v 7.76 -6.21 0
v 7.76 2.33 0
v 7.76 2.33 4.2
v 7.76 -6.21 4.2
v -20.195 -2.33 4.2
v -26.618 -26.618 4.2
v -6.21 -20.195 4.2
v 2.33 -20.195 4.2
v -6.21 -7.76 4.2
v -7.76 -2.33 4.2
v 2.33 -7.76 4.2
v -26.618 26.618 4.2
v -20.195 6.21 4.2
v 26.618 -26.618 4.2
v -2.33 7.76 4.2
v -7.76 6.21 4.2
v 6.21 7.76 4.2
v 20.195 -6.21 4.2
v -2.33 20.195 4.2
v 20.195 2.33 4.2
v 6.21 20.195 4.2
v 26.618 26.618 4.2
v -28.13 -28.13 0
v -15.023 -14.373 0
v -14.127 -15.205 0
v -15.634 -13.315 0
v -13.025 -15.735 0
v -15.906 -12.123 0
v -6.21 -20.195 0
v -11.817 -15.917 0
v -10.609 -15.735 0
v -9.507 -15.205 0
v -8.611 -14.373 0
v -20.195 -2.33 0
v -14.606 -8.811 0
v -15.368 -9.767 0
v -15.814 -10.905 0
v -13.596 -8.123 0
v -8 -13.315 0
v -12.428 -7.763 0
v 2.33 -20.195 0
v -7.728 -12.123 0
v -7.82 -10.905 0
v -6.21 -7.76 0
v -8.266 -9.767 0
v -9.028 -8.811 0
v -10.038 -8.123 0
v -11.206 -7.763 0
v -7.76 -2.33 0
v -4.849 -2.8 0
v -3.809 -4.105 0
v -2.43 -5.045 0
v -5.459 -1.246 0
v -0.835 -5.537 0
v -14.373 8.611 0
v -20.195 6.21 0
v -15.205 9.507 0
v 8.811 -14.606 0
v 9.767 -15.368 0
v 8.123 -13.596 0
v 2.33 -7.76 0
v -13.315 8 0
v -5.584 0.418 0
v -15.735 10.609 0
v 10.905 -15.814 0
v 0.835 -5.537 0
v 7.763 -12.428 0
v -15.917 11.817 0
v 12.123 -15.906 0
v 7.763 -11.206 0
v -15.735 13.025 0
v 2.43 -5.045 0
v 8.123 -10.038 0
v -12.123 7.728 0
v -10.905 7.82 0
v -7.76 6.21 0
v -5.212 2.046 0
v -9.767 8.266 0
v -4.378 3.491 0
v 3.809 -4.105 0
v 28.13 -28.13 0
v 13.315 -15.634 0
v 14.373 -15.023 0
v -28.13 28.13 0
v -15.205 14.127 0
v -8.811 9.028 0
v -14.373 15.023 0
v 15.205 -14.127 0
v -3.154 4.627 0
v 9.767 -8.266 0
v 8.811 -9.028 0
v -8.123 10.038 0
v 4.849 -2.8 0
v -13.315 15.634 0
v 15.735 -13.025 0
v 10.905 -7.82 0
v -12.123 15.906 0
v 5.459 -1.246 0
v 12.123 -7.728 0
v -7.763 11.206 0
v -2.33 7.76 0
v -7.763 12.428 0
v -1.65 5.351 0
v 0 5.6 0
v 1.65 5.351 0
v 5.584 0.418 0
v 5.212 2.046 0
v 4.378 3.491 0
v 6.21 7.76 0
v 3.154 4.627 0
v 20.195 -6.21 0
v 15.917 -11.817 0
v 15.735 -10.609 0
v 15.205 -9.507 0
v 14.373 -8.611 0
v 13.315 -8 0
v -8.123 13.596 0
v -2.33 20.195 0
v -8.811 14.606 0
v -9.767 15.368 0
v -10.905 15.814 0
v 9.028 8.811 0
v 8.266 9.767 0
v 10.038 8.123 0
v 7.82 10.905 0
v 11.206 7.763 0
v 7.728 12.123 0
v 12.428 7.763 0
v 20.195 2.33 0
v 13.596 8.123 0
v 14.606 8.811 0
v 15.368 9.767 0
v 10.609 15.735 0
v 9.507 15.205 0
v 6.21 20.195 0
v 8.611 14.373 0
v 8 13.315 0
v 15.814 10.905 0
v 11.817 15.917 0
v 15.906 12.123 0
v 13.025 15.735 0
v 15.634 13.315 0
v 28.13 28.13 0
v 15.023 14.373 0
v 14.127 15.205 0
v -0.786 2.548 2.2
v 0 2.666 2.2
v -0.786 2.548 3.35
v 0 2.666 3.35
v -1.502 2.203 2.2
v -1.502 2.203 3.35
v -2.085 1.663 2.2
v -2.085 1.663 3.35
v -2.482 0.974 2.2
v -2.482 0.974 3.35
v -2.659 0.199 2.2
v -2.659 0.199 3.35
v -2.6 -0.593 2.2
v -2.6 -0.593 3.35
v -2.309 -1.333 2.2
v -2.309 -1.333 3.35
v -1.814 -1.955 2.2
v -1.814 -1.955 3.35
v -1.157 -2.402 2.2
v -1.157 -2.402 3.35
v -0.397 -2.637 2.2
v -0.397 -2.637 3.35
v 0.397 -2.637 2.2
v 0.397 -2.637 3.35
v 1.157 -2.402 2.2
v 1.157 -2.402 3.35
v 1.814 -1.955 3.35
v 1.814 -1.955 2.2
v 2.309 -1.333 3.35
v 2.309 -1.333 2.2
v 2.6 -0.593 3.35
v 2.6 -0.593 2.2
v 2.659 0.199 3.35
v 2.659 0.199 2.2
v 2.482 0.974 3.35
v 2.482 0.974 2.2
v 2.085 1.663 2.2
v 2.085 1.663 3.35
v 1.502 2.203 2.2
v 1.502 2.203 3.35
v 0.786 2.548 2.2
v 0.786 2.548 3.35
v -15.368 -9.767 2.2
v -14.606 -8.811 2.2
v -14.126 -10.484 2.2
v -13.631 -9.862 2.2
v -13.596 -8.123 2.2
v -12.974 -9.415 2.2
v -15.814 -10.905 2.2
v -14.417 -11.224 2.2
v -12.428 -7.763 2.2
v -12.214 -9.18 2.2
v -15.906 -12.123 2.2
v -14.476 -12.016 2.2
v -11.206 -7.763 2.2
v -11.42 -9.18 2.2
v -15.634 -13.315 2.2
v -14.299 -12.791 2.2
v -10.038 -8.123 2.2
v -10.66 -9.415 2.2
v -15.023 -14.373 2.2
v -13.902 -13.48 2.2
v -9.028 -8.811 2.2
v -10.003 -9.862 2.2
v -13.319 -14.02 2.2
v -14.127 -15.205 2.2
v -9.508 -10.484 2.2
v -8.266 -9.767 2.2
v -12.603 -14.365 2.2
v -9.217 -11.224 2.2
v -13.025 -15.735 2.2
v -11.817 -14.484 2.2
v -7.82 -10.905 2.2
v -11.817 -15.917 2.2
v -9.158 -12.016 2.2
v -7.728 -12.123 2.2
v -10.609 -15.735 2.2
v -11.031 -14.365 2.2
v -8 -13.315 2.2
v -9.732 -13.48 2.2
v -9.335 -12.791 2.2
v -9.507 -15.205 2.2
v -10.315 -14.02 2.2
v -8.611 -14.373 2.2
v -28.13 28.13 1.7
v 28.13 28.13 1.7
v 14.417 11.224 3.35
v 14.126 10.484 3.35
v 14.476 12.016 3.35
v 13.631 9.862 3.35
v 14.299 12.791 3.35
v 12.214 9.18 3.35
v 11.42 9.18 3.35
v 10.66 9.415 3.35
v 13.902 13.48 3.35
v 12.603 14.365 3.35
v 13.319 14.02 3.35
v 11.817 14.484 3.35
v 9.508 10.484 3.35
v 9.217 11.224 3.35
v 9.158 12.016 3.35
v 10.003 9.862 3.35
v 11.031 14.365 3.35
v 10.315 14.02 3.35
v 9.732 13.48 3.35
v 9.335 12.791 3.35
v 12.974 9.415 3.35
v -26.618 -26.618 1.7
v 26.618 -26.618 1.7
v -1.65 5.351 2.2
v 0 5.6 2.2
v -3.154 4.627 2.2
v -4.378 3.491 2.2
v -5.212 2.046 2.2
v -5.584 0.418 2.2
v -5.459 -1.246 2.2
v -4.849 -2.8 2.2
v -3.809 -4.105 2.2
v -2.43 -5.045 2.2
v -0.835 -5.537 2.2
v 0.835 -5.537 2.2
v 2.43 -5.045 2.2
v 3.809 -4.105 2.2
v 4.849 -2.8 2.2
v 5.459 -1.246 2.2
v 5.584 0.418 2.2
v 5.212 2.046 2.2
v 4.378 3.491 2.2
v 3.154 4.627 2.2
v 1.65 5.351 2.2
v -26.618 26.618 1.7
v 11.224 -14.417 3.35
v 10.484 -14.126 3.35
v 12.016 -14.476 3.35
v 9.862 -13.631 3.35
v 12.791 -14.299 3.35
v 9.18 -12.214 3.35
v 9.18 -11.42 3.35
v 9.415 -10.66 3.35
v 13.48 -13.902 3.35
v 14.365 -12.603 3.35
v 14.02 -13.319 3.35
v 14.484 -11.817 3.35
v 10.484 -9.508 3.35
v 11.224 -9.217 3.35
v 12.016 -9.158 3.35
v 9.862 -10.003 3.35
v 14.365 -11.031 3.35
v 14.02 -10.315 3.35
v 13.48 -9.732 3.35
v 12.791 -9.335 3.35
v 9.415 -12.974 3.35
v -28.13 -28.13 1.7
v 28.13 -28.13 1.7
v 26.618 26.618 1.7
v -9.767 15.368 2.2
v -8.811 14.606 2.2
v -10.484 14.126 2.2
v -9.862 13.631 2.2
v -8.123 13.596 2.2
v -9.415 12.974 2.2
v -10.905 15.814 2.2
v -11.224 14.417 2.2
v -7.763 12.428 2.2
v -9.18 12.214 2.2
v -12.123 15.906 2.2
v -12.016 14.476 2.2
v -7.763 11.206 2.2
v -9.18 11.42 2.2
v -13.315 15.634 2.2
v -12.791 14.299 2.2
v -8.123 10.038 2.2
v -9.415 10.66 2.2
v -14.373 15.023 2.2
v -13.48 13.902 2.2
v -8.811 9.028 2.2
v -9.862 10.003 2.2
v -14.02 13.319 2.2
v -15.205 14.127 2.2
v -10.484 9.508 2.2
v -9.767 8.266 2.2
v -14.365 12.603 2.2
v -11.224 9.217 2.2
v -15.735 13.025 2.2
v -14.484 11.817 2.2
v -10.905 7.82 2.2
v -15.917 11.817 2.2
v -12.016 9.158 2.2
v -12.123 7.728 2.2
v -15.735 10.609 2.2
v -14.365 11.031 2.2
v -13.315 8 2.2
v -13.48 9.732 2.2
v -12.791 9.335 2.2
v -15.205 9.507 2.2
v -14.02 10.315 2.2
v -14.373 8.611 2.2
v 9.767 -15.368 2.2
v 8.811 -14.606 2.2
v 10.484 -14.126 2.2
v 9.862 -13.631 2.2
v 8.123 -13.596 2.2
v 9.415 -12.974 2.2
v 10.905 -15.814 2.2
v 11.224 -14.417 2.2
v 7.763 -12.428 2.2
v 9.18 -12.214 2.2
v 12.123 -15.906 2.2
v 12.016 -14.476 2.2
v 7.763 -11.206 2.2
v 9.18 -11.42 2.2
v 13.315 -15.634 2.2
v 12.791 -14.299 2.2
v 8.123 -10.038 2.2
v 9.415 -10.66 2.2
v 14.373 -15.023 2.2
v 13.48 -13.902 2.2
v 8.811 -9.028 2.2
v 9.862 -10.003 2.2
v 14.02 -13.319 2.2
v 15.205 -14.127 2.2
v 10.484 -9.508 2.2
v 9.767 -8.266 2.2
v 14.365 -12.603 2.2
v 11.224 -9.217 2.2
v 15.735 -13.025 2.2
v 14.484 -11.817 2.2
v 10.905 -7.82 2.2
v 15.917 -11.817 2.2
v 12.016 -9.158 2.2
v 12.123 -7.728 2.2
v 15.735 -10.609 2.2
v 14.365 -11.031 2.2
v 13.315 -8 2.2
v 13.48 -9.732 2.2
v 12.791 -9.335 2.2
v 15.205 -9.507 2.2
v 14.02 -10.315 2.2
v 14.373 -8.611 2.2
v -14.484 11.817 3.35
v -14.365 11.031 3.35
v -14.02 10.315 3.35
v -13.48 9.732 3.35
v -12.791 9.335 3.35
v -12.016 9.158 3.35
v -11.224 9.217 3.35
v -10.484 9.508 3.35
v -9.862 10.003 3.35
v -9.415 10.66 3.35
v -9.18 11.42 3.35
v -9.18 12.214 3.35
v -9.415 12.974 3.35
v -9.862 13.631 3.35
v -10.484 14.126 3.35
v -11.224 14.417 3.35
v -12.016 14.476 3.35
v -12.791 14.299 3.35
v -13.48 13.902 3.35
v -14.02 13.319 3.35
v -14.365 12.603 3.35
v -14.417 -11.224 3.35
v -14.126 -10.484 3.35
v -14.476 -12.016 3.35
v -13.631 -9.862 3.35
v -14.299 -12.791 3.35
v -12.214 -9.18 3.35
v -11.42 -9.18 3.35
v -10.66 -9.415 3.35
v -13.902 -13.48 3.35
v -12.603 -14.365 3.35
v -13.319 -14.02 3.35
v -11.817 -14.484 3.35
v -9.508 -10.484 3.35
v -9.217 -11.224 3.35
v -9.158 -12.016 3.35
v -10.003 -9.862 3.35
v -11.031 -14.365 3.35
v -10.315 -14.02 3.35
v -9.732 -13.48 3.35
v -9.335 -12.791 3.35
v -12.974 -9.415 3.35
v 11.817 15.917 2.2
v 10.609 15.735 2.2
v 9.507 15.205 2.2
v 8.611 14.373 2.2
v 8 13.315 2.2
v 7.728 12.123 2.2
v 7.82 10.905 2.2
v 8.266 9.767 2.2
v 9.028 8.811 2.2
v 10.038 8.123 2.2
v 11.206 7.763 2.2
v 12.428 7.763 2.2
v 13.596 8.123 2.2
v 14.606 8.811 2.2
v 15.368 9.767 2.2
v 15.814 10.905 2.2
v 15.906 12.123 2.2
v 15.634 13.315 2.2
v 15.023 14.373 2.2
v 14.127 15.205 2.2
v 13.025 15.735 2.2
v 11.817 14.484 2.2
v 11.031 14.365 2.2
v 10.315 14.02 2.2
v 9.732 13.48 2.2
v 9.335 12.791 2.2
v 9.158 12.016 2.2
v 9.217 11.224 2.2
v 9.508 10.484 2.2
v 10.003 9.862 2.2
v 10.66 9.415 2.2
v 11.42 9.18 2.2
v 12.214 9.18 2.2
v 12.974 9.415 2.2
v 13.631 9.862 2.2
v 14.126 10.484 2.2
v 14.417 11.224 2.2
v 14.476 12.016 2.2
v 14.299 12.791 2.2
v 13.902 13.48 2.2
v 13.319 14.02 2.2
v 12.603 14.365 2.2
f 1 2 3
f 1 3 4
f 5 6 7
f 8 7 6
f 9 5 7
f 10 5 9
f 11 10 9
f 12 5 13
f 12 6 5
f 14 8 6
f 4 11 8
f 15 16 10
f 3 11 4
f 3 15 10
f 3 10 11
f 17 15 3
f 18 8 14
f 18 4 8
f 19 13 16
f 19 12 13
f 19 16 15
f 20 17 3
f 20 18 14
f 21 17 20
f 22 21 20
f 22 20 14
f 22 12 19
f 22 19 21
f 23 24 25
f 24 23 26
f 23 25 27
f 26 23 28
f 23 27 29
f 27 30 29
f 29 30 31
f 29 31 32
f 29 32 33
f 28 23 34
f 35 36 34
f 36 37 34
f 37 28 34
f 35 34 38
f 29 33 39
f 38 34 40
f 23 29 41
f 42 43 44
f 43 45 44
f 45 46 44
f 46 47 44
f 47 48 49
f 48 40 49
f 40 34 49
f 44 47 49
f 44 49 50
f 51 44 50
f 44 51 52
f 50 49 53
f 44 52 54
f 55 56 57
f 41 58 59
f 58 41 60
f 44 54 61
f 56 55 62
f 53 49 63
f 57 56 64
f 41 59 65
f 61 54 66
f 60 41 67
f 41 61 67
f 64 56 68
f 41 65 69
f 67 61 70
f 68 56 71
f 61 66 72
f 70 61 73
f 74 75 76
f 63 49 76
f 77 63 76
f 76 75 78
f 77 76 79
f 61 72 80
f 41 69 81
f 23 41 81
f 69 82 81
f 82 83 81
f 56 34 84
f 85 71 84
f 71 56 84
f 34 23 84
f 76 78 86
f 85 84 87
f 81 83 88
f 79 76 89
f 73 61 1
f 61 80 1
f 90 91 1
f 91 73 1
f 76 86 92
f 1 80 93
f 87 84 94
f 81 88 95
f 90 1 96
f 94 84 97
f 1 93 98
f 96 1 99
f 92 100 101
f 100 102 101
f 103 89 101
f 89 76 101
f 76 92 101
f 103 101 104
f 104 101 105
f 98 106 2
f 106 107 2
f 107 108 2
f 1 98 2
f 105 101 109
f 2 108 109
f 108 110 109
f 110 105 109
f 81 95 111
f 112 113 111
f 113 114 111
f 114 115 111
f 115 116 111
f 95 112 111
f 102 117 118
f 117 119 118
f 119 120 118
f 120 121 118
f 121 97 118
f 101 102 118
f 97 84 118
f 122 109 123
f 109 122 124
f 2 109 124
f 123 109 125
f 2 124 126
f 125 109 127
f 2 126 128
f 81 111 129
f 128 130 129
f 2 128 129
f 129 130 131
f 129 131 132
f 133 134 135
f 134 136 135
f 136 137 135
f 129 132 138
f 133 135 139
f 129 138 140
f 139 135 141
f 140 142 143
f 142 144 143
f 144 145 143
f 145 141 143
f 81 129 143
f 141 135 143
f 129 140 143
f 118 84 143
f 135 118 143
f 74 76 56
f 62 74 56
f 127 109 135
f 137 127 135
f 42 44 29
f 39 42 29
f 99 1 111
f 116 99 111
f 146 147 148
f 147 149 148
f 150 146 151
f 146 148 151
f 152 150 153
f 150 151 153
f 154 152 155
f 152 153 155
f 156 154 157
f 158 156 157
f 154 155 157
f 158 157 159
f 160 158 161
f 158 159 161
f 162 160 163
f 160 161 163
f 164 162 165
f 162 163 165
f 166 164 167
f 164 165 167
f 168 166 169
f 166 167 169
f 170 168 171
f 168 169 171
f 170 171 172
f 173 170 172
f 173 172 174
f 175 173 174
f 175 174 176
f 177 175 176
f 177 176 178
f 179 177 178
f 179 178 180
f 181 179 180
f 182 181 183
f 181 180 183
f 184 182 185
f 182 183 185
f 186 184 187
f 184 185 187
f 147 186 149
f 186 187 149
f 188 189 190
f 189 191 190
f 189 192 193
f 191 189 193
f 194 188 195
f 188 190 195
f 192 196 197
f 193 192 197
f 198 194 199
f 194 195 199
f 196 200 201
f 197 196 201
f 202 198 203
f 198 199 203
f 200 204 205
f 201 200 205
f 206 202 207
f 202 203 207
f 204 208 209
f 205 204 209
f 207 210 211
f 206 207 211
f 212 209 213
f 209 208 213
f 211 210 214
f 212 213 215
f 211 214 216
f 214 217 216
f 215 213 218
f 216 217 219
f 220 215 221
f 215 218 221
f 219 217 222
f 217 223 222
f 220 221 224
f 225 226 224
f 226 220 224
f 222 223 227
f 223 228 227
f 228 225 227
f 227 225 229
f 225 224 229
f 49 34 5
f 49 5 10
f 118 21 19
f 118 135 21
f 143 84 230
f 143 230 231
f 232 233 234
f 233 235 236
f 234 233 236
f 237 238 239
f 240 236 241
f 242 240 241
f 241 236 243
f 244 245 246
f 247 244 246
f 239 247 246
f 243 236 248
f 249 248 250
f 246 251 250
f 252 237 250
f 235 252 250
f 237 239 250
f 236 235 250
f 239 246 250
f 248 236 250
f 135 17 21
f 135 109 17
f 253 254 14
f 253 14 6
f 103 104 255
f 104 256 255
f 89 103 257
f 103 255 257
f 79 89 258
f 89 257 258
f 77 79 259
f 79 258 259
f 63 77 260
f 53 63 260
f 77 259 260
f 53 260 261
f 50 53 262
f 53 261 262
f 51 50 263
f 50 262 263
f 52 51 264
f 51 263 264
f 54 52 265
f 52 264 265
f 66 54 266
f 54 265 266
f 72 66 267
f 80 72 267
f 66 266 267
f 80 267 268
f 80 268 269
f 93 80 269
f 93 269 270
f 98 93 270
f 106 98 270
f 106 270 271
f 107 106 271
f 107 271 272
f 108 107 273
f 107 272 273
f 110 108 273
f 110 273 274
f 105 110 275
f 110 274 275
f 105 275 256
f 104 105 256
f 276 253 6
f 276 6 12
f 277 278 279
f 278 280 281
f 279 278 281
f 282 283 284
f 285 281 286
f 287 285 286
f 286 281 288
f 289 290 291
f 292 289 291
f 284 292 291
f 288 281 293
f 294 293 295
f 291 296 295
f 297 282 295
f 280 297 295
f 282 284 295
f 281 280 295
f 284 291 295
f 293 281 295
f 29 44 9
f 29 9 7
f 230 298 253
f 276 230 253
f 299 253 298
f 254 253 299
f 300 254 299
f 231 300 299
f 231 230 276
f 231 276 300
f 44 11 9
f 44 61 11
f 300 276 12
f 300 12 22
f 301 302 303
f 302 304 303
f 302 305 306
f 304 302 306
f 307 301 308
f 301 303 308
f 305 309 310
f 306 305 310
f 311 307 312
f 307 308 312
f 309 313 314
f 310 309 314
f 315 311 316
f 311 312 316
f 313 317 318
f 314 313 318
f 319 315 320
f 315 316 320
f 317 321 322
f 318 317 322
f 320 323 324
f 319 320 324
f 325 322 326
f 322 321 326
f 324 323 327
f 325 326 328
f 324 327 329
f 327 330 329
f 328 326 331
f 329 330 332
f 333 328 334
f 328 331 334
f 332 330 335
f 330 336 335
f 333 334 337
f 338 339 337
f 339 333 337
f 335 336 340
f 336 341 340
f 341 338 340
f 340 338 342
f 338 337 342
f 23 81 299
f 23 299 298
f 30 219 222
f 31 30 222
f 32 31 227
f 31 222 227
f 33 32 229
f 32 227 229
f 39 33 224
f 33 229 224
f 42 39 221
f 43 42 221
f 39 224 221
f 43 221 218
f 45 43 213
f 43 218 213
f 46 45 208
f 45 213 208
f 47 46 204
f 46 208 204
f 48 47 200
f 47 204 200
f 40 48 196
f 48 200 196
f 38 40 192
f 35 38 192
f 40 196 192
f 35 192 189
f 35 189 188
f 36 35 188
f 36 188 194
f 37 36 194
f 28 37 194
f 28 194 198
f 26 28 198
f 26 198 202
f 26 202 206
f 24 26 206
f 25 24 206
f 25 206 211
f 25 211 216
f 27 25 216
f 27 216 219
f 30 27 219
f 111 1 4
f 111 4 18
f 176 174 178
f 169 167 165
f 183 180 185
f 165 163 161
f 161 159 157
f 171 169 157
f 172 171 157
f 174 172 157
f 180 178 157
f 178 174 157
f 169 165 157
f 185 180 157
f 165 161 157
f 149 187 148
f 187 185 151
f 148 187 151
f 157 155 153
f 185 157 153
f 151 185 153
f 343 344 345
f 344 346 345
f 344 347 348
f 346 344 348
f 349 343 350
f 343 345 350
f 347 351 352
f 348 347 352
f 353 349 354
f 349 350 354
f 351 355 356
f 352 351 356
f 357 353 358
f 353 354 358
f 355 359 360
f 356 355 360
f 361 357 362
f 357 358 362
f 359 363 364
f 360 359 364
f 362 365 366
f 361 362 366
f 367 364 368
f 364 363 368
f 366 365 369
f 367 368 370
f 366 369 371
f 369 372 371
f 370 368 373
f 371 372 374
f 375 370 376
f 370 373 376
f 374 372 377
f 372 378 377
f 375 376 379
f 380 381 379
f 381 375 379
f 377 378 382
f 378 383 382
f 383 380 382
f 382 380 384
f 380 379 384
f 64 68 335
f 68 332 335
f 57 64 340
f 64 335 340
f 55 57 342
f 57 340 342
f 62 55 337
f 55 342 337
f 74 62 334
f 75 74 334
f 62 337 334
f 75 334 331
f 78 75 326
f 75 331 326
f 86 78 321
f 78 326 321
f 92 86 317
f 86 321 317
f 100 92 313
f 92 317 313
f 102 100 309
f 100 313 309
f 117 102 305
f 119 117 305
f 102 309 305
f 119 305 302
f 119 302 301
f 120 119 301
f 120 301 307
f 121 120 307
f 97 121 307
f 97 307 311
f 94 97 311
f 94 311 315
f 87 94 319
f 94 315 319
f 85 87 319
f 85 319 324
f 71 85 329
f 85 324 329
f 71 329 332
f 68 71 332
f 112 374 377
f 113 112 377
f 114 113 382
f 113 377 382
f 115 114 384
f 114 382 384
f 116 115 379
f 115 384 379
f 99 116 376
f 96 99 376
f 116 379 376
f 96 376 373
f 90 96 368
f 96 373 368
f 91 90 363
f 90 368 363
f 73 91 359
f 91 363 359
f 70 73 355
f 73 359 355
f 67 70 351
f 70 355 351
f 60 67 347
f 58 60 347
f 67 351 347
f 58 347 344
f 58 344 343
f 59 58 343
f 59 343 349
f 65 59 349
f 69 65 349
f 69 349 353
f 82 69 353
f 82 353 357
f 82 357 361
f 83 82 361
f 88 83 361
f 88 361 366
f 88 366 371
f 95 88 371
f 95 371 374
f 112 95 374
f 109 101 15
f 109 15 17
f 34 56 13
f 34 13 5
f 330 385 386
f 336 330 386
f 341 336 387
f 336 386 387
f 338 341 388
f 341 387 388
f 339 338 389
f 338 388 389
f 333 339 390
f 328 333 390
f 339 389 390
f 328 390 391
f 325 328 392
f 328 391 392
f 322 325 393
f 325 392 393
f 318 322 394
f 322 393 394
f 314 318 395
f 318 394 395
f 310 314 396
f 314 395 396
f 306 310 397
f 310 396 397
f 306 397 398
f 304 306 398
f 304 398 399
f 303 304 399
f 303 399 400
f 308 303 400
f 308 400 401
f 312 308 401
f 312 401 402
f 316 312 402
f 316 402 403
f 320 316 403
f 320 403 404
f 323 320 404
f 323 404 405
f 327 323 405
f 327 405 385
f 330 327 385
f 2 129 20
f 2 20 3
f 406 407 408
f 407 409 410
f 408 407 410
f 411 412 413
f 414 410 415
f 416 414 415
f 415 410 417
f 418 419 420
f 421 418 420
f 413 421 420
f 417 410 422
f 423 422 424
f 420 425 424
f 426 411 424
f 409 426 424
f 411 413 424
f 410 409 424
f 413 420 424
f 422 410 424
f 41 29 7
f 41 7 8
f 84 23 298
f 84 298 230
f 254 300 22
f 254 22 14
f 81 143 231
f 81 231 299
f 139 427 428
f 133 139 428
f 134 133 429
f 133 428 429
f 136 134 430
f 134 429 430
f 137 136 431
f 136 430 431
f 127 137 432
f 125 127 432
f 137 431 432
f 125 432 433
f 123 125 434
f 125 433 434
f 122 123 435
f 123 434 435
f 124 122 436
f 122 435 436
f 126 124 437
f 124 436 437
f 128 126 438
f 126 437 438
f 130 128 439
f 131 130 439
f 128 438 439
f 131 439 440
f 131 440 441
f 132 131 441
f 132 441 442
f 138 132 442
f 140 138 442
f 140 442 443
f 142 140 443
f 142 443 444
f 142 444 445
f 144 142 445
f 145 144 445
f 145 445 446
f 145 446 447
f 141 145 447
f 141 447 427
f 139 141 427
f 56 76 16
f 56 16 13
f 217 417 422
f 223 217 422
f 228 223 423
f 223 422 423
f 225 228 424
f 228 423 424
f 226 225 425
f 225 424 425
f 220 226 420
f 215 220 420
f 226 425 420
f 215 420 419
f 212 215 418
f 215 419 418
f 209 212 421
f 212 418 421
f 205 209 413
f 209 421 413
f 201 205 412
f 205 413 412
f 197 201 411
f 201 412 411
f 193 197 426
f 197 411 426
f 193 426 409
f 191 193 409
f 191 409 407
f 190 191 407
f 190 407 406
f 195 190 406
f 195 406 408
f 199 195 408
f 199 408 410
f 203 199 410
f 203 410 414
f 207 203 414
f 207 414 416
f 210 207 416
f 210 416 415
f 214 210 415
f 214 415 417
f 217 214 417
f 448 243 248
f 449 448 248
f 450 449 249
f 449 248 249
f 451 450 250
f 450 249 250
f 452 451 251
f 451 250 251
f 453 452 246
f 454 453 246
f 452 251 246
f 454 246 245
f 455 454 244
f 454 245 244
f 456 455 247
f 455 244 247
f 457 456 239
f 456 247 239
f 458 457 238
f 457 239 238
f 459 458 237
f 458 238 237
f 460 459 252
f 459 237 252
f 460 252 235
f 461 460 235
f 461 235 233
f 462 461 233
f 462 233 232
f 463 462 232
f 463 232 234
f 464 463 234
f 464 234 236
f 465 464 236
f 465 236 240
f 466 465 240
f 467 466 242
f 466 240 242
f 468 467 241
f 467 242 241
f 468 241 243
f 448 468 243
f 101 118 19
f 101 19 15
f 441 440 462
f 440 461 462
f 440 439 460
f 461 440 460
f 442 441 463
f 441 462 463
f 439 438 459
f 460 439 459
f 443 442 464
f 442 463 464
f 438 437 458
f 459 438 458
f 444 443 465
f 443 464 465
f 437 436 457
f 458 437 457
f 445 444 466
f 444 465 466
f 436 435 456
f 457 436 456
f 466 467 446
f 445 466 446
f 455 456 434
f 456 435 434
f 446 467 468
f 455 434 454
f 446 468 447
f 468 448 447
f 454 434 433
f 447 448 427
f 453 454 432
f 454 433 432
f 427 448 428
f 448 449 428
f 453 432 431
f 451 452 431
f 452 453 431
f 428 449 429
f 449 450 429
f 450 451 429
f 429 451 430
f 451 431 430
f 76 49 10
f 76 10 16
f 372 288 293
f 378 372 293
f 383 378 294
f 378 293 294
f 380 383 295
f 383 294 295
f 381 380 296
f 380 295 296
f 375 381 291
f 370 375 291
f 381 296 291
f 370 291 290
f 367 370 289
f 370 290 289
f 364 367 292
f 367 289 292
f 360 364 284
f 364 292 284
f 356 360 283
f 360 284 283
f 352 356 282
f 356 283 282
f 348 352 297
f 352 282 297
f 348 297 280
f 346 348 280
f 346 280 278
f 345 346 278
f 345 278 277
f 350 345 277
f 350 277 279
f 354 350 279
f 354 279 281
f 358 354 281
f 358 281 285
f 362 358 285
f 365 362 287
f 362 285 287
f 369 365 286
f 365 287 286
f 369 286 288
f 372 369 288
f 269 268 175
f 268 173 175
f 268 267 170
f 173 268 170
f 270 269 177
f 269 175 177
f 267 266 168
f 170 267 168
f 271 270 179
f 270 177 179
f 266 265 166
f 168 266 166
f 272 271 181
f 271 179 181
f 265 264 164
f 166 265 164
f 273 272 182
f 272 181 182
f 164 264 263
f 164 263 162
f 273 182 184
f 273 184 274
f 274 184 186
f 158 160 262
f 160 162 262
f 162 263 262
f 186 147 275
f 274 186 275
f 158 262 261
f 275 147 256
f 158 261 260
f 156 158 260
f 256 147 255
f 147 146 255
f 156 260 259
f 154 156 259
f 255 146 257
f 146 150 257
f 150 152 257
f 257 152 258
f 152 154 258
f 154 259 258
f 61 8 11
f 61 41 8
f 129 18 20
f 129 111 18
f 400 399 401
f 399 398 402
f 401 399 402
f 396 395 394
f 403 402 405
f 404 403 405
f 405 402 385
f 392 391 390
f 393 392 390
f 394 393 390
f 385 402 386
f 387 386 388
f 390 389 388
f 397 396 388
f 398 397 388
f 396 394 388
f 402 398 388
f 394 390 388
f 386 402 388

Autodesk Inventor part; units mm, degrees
ref_plane "YZ Plane" through (0, 0, 0) normal (1, 0, 0) x (0, 1, 0)
ref_plane "XZ Plane" through (0, 0, 0) normal (0, 1, 0) x (-1, 0, 0)
ref_plane "XY Plane" through (0, 0, 0) normal (0, 0, 1) x (1, 0, 0)
sketch "Skizze1" plane through (0, 0, 0) normal (0, 0, 1) x (1, 0, 0)
  line L0 (-28.13, 28.13) -> (28.13, 28.13)
  line L1 (28.13, 28.13) -> (28.13, -28.13)
  line L2 (28.13, -28.13) -> (-28.13, -28.13)
  line L3 (-28.13, -28.13) -> (-28.13, 28.13)
  line L4 (-39.382, 0) -> (39.382, 0) construction
  line L5 (0, -39.382) -> (0, 39.382) construction
  point P0 (0, 0)
  dimension "d0" = 56.26
extrude "Extrusion1" add sketch "Skizze1" along normal blind 1.7
sketch "Skizze2" plane through (0, 0, 1.7) normal (0, 0, 1) x (1, 0, 0)
  line L0 (0, -39.382) -> (0, 39.382) construction
  line L1 (-39.382, 0) -> (39.382, 0) construction
  line L2 (-26.6175, 26.6175) -> (26.6175, 26.6175)
  line L3 (26.6175, 26.6175) -> (26.6175, -26.6175)
  line L4 (26.6175, -26.6175) -> (-26.6175, -26.6175)
  line L5 (-26.6175, -26.6175) -> (-26.6175, 26.6175)
  line L6 (28.13, 28.13) -> (-28.13, 28.13) projected
  point P0 (0, 0)
  dimension "d3" = 53.235
extrude "Extrusion2" add sketch "Skizze2" along normal blind 2.5
sketch "Skizze3" plane through (0, 0, 0) normal (0, 0, -1) x (-1, 0, 0)
  line L0 (28.13, -28.13) -> (-28.13, -28.13) projected
  line L1 (28.13, 28.13) -> (28.13, -28.13) projected
  line L2 (-28.13, 28.13) -> (28.13, 28.13) projected
  line L3 (-28.13, -28.13) -> (-28.13, 28.13) projected
  line L4 (-6.21, 20.195) -> (2.33, 20.195)
  line L5 (2.33, 20.195) -> (2.33, 7.76)
  line L6 (2.33, 7.76) -> (-6.21, 7.76)
  line L7 (-6.21, 7.76) -> (-6.21, 20.195)
  point P0 (0, 0)
  point P1 (0, 0)
  dimension "d6" = 21.92
  dimension "d7" = 8.54
  dimension "d8" = 12.435
  dimension "d9" = 35.89
extrude "Extrusion3" cut sketch "Skizze3" against normal up to surface (4.2 mm away) contours L4 L5 L6 L7
pattern_circular "Runde Anordnung1" count 4 over 360 about axis through (0, 0, -10) along (0, 0, 1) of "Extrusion3"
sketch "Skizze4" plane through (0, 0, 0) normal (0, 0, -1) x (-1, 0, 0)
  line L0 (-28.13, -28.13) -> (-28.13, 28.13) projected
  line L1 (-28.13, 28.13) -> (28.13, 28.13) projected
  point P0 (0, 0)
  point P1 (-11.817, 11.817)
  dimension "d15" = 16.313
  dimension "d16" = 16.313
hole "Bohrung1" at (11.817, 11.817, 0) direction (0, 0, 1) diameter 5.333 depth 3.35 counterbore diameter 8.2 counterbore depth 2.2
pattern_circular "Runde Anordnung2" count 4 over 360 about axis through (0, 0, -10) along (0, 0, 1) of "Bohrung1"
sketch "Skizze5" plane through (0, 0, 0) normal (0, 0, -1) x (-1, 0, 0)
  point P0 (0, 0)
  point P1 (0, 0)
hole "Bohrung2" at (0, 0, 0) direction (0, 0, 1) diameter 5.333 depth 3.35 counterbore diameter 11.199 counterbore depth 2.2
properties part number "PCB_cover_platte_originaldicke"
